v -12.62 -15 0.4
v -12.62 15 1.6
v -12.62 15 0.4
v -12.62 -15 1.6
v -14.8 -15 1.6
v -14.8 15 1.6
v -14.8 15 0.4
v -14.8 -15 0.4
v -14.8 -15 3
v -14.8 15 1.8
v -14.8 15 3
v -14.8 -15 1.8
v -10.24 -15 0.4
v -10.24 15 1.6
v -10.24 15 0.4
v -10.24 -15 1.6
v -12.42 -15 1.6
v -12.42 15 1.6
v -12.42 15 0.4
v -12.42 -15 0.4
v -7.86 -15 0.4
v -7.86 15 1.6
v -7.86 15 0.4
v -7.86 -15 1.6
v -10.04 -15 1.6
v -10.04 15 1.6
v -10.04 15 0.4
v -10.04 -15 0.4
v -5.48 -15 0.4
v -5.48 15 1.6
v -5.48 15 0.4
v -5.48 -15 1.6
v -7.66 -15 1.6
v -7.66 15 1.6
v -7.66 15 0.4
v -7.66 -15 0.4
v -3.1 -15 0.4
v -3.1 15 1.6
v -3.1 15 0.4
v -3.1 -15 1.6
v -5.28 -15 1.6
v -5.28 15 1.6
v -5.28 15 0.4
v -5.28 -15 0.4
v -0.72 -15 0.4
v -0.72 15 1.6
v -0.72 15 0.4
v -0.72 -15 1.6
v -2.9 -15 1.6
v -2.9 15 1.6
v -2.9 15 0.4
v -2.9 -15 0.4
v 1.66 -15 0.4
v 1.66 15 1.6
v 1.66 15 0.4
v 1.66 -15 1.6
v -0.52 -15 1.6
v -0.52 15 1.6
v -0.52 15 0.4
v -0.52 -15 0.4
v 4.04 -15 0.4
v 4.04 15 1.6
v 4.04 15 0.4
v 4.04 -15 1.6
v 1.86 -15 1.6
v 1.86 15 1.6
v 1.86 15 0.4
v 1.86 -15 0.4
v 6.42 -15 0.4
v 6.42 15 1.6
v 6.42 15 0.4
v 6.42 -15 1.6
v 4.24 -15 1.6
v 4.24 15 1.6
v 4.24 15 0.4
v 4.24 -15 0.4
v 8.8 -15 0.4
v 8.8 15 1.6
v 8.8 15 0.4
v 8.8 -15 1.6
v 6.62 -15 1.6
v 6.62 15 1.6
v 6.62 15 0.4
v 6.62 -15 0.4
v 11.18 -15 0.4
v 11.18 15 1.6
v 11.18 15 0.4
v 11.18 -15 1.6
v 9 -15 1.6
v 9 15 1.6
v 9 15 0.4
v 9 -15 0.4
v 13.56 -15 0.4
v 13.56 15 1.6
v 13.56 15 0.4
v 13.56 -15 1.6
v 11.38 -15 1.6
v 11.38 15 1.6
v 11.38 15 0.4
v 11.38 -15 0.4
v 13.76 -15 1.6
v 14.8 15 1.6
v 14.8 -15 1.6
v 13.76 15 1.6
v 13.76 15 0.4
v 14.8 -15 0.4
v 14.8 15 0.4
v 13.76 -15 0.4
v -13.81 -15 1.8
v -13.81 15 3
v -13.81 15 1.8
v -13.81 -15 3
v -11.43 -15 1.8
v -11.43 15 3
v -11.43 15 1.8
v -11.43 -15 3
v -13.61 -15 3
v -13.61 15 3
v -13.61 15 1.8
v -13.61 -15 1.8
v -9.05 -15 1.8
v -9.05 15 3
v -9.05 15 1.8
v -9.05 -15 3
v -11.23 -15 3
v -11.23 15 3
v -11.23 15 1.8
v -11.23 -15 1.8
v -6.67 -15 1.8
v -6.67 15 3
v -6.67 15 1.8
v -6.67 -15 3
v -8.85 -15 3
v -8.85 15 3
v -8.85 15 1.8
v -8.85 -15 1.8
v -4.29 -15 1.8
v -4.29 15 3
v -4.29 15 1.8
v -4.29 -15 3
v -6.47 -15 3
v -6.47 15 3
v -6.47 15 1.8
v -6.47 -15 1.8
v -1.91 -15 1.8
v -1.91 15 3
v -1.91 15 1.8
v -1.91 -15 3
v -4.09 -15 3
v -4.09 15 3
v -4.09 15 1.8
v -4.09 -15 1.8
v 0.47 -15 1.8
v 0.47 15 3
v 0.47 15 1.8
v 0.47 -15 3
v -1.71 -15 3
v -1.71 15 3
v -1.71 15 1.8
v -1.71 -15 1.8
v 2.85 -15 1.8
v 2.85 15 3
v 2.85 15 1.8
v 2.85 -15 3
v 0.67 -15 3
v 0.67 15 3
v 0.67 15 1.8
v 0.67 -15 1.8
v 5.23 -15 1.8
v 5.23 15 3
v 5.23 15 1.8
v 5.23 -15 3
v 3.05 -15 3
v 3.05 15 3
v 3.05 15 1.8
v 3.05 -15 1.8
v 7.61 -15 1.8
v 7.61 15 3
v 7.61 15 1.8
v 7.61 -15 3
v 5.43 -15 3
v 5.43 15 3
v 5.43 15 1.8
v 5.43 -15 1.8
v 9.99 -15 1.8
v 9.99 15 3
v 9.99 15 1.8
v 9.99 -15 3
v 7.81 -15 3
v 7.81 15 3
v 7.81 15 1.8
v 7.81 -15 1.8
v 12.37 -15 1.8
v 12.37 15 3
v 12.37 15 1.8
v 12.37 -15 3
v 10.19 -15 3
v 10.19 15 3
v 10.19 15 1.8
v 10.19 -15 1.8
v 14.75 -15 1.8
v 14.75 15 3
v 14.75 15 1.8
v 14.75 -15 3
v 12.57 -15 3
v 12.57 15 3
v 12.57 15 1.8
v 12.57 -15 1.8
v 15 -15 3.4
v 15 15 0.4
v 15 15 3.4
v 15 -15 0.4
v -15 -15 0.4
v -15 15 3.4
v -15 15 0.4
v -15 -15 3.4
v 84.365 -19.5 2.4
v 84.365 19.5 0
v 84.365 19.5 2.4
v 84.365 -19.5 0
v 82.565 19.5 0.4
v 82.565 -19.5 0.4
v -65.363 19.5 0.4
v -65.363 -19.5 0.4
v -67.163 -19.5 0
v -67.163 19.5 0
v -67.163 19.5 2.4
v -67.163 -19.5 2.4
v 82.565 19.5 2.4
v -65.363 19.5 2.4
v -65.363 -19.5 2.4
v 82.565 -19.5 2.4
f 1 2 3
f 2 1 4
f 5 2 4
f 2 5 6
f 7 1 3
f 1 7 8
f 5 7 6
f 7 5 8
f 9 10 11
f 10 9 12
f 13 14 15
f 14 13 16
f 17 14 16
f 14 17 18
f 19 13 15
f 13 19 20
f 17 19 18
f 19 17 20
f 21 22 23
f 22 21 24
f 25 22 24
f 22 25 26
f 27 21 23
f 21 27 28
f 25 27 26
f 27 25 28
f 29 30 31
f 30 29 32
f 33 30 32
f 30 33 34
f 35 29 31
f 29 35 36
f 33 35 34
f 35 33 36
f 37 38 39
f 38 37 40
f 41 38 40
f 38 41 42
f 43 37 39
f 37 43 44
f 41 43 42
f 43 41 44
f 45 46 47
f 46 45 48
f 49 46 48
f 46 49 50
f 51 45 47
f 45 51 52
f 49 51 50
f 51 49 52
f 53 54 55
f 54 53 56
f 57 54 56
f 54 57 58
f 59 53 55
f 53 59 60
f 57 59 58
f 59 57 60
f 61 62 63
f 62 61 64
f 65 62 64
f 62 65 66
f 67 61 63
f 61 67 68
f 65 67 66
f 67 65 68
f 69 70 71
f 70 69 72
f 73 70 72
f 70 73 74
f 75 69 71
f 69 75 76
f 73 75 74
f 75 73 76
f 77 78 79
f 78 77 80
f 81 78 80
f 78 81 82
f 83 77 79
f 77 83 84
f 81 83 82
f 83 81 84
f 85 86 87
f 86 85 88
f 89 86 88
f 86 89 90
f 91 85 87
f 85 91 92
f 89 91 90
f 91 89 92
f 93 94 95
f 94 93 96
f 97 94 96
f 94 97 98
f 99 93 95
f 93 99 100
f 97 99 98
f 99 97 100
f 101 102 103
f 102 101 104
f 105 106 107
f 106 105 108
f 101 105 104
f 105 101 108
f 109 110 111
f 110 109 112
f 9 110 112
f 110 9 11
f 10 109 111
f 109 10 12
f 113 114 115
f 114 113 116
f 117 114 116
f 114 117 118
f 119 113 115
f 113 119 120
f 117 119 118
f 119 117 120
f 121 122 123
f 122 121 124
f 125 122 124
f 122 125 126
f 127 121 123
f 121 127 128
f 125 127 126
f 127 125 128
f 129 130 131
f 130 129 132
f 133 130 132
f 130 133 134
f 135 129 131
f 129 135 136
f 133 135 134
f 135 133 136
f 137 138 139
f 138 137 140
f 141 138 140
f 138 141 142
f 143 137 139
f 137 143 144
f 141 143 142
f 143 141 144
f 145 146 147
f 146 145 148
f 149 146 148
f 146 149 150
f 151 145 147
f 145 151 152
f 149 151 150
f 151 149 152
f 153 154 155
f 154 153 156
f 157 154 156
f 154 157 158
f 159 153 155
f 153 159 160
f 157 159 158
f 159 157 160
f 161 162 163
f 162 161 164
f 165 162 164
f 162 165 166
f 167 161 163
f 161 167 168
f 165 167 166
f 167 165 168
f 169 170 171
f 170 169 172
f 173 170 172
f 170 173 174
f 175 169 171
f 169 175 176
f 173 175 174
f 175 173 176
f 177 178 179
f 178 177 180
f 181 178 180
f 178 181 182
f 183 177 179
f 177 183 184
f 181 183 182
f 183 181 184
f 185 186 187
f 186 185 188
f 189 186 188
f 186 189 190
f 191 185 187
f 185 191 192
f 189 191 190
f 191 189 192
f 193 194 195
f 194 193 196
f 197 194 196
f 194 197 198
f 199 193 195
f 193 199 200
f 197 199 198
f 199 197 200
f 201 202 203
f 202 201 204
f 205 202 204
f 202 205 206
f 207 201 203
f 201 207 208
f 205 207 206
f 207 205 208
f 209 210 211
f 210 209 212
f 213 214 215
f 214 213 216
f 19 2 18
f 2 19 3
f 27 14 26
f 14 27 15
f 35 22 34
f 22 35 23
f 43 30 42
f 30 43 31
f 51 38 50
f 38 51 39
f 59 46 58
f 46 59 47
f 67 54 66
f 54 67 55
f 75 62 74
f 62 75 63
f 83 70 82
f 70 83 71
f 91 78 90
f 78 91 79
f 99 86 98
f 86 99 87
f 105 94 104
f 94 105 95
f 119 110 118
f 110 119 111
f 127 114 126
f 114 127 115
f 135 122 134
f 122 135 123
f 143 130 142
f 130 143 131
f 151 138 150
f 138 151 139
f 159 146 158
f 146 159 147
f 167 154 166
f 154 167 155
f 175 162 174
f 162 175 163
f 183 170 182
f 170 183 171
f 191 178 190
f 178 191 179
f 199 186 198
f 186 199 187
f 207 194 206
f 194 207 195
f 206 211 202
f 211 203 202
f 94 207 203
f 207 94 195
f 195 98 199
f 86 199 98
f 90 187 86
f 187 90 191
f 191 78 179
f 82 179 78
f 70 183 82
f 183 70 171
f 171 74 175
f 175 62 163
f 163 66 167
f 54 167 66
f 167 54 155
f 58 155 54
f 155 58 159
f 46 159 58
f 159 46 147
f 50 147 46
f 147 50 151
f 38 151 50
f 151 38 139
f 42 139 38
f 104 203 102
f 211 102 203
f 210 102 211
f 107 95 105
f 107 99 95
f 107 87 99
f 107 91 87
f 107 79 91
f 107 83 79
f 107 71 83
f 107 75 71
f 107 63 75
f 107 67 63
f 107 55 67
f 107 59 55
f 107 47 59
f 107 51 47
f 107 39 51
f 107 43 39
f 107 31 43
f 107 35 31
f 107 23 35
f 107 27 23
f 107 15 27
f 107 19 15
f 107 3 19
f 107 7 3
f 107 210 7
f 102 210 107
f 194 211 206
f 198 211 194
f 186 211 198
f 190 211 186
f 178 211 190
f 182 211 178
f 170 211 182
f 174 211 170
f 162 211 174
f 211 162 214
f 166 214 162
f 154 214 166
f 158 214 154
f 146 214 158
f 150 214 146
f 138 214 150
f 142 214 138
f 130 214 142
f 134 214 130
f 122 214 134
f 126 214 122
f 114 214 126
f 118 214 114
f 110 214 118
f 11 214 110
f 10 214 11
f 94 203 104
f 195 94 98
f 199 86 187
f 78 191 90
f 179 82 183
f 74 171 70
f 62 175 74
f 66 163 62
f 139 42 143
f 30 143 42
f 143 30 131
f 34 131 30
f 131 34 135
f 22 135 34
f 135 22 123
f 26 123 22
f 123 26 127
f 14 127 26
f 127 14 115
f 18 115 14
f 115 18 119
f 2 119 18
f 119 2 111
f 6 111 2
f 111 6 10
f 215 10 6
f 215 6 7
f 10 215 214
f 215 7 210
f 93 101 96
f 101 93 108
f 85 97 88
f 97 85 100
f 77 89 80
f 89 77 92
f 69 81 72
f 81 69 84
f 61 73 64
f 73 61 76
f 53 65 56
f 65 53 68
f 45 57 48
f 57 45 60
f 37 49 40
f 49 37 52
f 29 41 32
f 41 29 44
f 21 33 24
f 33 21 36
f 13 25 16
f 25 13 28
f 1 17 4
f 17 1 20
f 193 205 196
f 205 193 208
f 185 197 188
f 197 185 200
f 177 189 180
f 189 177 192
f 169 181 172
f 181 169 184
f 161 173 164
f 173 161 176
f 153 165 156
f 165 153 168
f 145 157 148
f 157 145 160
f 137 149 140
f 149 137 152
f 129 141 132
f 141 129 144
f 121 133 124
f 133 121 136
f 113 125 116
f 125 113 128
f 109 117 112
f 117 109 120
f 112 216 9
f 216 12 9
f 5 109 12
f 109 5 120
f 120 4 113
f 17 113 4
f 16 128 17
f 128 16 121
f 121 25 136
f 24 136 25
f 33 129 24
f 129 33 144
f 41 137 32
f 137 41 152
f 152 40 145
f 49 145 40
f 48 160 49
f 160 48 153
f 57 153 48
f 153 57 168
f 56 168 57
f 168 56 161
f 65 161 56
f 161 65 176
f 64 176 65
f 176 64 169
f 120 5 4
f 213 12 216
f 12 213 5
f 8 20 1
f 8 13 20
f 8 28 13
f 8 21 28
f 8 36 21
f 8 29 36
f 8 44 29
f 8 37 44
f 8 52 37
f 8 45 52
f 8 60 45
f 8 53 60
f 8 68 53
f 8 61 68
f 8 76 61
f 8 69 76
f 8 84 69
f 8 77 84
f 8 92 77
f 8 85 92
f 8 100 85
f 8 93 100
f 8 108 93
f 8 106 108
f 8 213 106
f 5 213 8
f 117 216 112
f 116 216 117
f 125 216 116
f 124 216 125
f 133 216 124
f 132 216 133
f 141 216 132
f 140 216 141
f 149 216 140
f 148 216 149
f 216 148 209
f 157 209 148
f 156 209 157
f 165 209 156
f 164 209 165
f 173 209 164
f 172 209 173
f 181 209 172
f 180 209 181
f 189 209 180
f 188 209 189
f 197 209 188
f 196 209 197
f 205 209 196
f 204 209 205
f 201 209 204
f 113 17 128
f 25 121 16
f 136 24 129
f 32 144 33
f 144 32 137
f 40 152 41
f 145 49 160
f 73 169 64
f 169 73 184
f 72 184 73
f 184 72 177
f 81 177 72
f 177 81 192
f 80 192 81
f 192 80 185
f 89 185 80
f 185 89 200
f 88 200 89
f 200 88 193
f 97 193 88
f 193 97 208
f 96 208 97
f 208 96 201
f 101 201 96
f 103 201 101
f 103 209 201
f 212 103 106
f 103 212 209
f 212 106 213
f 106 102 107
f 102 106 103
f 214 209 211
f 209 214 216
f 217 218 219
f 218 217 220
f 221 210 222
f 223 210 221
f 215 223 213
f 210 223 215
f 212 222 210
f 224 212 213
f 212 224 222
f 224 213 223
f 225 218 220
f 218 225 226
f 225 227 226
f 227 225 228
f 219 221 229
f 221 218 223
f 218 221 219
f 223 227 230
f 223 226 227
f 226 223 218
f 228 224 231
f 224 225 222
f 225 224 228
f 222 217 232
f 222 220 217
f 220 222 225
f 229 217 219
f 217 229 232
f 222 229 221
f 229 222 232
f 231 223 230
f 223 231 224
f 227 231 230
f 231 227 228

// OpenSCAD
// Fingerprint parameters
imageResolution = 19.7; //dots per mm
imageX = 416; //px
imageY = 560; //px
file = "FGen1.png";
fingerprintX = 30; //mm
fingerprintY = 30; //mm
fingerprintScale = 1.4;

//Other parameters (these should not be changed)
fingerprintRidgeHeight = .2; //mm
fingerprintBaseThickness = .2; //mm
base = .4; //mm
imageScaleFactor = 1/imageResolution;
hotFudge = 20; //mm
fingerEndWingLength = 69.365;//-X side
motorEndWingLength = 52.163;//+X side
//wingLength = 20;//4.7;
wingWidth = 1.8;
wingHeight = 2.4; //Including base, mm
spongeHeight = 3;
spongeCellWidth = 2.18;
spongeCellHeight = 1.2;
spongeWall=.2;
spongeLength = fingerprintY;
totalLength = 39;//36;

union() {
    translate([0, 0, spongeHeight+base-fingerprintBaseThickness])
        union() {
            sponge (spongeCellWidth, spongeCellHeight, spongeWall, spongeWall, fingerprintX, spongeLength, spongeHeight);
            translate([0,0,fingerprintRidgeHeight+fingerprintBaseThickness])
                fingerprint(file, fingerprintScale, fingerprintX, fingerprintY, fingerprintRidgeHeight, fingerprintBaseThickness);
        };
   // translate([fingerprintX / 2, -totalLength / 2, 0]) cube([fingerEndWingLength, totalLength, base], center = false);
    translate([-fingerprintX / 2-motorEndWingLength, -totalLength / 2, 0]) cube([motorEndWingLength+fingerprintX+fingerEndWingLength, totalLength, base], center = false);
    translate([fingerprintX / 2 + fingerEndWingLength - wingWidth, -totalLength / 2, 0]) cube([wingWidth, totalLength, wingHeight]);
    translate([-fingerprintX / 2 - motorEndWingLength, -totalLength / 2, 0]) cube([wingWidth, totalLength, wingHeight]);

    //fingerprint("FGen1.png", 1, 24, 24, .2, .2);
}

module fingerprint(fname, scale, xDim, yDim, ridgeThickness, baseThickness) {
    union() {
        intersection() {
            scale([scale,scale,1],center=true)
            resize(newsize=[imageX*imageScaleFactor,imageY*imageScaleFactor, ridgeThickness])
                surface(file = fname, center = true, invert = true);;
            cube([xDim, yDim, ridgeThickness * 2], center = true);
        }
        translate([-xDim/2, -yDim/2, -2*baseThickness])
            cube([xDim, yDim, baseThickness]);
    }
}

module sponge(holeSize, sliceSize, strutSize, slabSize, xDim, yDim, zDim) {

  n = (zDim - slabSize) / (slabSize + sliceSize);

  size = [xDim, yDim, slabSize * (n + 1) + sliceSize * n]; //x,y,z size

  translate([-xDim / 2, -yDim / 2, -( slabSize * (n + 1) + sliceSize * n)])
  union() {
    difference() {
      cube(size);

      for (z = [slabSize: sliceSize + slabSize: size[2] - slabSize]) {
        for (x = [0: holeSize + strutSize: size[0]]) {
/*
          if (round(x / (holeSize + strutSize)) % 2 == 1 && z == slabSize) {
            translate([x + strutSize, -hotFudge/2, -hotFudge])
            cube([holeSize, size[1]+hotFudge, sliceSize + slabSize+hotFudge]);
          } else
         */
          if (round((z - slabSize) / (sliceSize + slabSize)) % 2 == 0) {
            //if (x < size[0] - holeSize)o {
            translate([x + strutSize, -hotFudge/2, z])
            cube([holeSize, size[1]+hotFudge, sliceSize]);
            //}
          } else {
            translate([x - (holeSize / 2) + strutSize / 2, -hotFudge/2, z])
            cube([holeSize, size[1]+hotFudge, sliceSize]);
          }

          //echo(x = x, z = z);
        }
      }

    }
    cube([strutSize, size[1], size[2]]);
    translate([size[0] - strutSize, 0, 0])
    cube([strutSize, size[1], size[2]]);
  };
}
